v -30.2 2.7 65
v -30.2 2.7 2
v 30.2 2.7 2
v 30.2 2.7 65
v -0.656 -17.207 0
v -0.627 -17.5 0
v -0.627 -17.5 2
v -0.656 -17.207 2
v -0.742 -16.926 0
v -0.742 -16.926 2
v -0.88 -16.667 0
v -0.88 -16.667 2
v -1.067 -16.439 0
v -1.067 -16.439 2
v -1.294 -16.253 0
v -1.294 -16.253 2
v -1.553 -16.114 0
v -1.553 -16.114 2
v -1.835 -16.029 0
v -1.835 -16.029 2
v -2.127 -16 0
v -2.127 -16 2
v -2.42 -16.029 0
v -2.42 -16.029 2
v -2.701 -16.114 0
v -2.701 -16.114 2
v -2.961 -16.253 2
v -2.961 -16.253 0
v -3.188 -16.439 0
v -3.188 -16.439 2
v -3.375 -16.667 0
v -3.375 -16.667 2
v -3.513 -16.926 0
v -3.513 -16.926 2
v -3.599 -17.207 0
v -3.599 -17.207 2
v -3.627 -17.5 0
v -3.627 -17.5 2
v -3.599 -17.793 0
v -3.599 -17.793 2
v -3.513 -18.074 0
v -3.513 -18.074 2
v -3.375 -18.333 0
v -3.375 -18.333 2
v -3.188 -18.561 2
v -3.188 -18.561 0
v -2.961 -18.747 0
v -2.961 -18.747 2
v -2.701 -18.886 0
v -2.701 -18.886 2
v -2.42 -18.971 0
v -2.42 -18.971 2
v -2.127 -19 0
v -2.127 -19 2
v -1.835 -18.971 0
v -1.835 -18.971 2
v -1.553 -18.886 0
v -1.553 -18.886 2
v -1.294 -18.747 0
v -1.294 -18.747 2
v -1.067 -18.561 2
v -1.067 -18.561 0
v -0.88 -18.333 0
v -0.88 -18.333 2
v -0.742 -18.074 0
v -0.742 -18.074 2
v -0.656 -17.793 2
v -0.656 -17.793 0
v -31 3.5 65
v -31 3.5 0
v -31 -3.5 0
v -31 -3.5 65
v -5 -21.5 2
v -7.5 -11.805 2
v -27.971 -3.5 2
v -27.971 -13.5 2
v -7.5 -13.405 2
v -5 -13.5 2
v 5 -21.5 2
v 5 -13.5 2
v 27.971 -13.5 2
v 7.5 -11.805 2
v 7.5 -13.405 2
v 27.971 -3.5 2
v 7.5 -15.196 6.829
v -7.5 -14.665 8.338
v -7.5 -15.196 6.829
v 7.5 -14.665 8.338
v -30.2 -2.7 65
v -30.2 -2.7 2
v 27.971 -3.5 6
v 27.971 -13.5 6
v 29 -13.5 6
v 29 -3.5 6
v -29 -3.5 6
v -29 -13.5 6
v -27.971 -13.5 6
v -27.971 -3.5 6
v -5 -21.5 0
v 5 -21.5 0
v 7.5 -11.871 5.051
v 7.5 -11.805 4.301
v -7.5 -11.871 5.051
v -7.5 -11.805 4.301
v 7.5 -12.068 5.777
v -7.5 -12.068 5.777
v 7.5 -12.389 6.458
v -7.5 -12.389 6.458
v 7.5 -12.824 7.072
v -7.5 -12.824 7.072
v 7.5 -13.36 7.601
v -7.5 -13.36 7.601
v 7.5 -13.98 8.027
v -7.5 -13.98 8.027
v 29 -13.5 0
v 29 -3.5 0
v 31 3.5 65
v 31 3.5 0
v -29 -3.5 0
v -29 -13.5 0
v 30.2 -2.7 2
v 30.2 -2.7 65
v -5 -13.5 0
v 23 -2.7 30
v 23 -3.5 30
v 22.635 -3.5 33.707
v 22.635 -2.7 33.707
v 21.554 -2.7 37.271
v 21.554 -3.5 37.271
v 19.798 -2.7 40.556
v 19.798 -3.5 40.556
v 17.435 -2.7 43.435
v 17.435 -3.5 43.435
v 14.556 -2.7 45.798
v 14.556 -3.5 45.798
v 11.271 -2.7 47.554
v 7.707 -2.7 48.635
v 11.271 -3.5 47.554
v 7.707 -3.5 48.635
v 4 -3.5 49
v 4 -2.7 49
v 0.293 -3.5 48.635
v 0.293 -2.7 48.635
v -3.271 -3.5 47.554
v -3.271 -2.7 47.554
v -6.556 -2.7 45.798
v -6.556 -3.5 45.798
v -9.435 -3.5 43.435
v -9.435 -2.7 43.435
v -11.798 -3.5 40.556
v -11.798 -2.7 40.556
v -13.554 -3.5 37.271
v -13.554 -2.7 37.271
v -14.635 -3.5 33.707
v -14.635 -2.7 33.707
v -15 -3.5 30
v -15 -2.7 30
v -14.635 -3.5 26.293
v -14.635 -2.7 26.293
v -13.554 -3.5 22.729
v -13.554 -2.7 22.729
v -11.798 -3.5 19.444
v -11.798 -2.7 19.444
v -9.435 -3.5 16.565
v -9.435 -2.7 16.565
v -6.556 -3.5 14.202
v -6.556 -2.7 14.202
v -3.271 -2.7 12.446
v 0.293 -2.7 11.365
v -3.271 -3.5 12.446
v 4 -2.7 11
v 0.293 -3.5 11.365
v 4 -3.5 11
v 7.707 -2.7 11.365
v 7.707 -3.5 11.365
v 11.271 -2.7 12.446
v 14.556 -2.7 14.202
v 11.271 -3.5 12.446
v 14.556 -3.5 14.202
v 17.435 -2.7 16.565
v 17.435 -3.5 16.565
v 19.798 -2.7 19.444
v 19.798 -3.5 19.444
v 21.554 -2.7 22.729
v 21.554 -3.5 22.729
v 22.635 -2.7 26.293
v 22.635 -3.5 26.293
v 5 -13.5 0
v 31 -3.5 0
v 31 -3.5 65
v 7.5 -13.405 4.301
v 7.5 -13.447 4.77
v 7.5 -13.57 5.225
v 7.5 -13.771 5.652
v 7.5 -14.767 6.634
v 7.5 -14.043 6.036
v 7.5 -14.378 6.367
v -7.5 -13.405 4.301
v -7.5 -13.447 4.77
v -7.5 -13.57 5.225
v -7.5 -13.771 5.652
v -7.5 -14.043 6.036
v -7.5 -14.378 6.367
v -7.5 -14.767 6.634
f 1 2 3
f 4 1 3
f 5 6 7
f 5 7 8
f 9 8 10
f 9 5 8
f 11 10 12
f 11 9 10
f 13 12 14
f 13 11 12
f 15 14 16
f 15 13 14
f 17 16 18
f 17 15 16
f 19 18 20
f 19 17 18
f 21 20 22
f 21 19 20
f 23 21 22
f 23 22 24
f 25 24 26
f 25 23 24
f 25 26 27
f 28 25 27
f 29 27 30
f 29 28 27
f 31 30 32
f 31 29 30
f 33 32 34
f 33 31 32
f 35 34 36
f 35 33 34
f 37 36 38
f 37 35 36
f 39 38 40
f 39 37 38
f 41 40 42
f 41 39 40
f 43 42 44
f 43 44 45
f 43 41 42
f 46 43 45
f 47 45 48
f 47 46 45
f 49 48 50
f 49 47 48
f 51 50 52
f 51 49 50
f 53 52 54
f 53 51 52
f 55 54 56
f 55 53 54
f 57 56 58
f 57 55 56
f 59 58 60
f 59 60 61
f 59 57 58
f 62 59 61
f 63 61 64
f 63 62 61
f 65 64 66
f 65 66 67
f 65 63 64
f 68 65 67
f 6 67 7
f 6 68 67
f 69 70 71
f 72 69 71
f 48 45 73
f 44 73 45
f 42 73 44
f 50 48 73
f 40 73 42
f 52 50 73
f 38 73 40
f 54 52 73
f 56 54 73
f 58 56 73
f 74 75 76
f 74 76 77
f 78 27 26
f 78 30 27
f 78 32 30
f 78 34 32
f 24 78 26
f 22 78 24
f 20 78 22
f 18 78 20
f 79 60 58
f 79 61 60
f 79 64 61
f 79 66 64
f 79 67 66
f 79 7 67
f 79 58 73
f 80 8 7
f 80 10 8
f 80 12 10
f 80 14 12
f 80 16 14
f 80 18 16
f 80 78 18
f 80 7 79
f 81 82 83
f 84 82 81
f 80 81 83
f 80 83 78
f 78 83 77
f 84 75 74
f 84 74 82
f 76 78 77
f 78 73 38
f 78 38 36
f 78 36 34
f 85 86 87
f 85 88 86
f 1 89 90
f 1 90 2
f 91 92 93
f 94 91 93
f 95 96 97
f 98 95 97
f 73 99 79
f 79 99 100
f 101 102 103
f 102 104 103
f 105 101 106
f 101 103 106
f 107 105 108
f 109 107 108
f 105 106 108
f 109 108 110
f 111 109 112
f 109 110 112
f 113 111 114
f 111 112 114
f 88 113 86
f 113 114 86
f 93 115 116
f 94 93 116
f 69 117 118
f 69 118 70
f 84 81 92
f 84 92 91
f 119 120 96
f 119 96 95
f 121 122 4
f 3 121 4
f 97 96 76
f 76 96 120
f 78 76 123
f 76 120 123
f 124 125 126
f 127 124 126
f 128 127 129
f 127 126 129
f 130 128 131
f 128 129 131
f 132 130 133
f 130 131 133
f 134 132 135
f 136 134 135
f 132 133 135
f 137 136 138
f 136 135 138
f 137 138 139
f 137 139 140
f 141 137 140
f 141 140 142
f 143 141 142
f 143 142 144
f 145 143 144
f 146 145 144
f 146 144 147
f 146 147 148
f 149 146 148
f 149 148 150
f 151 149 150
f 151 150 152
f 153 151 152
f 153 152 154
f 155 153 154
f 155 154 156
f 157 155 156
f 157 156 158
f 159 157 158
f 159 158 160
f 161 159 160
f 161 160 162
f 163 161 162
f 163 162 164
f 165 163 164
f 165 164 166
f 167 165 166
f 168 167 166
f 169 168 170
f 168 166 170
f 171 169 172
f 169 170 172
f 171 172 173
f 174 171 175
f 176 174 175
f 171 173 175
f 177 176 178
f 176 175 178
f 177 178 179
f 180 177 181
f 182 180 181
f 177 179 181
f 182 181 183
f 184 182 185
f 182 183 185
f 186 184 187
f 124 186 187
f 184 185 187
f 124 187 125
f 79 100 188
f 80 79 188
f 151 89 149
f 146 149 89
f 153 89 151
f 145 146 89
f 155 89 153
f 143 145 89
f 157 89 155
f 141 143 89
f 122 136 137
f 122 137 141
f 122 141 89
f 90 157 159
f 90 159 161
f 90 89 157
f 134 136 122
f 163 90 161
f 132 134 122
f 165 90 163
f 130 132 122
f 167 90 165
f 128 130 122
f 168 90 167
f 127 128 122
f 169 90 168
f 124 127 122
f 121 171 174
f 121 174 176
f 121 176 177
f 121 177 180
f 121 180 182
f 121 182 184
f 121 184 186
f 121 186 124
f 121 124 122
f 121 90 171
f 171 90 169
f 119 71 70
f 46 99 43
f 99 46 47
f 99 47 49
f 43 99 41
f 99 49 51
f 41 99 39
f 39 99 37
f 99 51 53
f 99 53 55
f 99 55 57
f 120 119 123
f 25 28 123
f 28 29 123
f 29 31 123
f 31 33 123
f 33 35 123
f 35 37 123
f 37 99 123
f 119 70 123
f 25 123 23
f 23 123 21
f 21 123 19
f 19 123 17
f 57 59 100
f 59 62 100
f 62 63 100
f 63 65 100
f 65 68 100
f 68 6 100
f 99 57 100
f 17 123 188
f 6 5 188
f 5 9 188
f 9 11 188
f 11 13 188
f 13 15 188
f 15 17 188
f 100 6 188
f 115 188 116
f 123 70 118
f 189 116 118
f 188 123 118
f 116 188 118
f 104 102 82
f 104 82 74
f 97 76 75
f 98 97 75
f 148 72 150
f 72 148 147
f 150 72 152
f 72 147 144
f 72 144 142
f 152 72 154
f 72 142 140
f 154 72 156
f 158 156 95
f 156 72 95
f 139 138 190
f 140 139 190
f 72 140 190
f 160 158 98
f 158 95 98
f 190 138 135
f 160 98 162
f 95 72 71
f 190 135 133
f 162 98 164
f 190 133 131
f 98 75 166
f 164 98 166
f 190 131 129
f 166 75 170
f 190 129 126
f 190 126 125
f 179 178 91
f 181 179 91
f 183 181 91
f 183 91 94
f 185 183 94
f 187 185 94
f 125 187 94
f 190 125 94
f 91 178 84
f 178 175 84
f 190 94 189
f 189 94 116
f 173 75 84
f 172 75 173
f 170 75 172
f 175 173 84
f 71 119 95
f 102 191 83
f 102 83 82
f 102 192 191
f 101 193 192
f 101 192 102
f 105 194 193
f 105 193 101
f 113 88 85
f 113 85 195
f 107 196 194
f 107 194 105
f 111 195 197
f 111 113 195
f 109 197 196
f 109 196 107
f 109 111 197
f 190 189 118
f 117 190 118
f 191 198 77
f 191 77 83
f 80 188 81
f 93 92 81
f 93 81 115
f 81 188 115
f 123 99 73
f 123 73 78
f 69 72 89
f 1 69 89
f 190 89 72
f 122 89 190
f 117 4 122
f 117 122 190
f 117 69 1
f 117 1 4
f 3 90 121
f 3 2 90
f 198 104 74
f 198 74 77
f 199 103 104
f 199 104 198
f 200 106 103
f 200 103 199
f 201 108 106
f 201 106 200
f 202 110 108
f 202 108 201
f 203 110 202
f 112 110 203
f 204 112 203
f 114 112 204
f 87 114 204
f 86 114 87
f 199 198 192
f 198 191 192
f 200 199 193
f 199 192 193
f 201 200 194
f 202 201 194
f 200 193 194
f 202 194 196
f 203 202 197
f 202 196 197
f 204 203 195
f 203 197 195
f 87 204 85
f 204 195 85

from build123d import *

# Parameters (mm, degrees)
F0_W     = 60.4
F0_H     = 5.4
F0_W_2   = 10
F0_H_2   = 8
F0_R     = 1.5
F0_W_3   = 1.0285907388
F0_H_3   = 10
F1_DEPTH = 2
F2_DEPTH = 65
F3_R     = 19
F4_DEPTH = 2
F5_DEPTH = 6
F6_W     = 15
F6_H     = 1.6


with BuildPart() as f1:
    # F0 (on Top) → F1 (new body)
    with BuildSketch(Plane.XY):
        Polygon((27.9714092612, -13.5), (27.9714092612, -3.5), (-27.9714092612, -3.5), (-27.9714092612, -13.5), (-5, -13.5), (5, -13.5), align=None)
        Polygon((29, -3.5), (31, -3.5), (31, 3.5), (-31, 3.5), (-31, -3.5), (-29, -3.5), (-27.9714092612, -3.5), (27.9714092612, -3.5), align=None)
        Rectangle(F0_W, F0_H, mode=Mode.SUBTRACT)
        Rectangle(F0_W, F0_H)
        with Locations((0, -17.5)):
            Rectangle(F0_W_2, F0_H_2)
        with Locations((-2.1274185274, -17.5)):
            Circle(F0_R, mode=Mode.SUBTRACT)
        with Locations((-28.4857046306, -8.5)):
            Rectangle(F0_W_3, F0_H_3)
        with Locations((28.4857046306, -8.5)):
            Rectangle(F0_W_3, F0_H_3)
    extrude(amount=F1_DEPTH)

    # F0 (on Top) → F2 (join)
    with BuildSketch(Plane.XY):
        Polygon((29, -3.5), (31, -3.5), (31, 3.5), (-31, 3.5), (-31, -3.5), (-29, -3.5), (-27.9714092612, -3.5), (27.9714092612, -3.5), align=None)
        Rectangle(F0_W, F0_H, mode=Mode.SUBTRACT)
    extrude(amount=F2_DEPTH)

    # F3 (on face) → F4 (cut)
    with BuildSketch(Plane.XZ.offset(3.5)):
        with Locations((4, 30)):
            Circle(F3_R)
    extrude(amount=-F4_DEPTH, mode=Mode.SUBTRACT)

    # F0 (on Top) → F5 (join)
    with BuildSketch(Plane.XY):
        with Locations((28.4857046306, -8.5)):
            Rectangle(F0_W_3, F0_H_3)
        with Locations((-28.4857046306, -8.5)):
            Rectangle(F0_W_3, F0_H_3)
    extrude(amount=F5_DEPTH)

    # F8: sweep along a path in F7
    with BuildLine(Plane.YZ) as f8_path:
        Line((-13.6184291914, 1.5092007816), (-13.6184291914, 4.3010520749))
        ThreePointArc((-13.6184291914, 4.3010520749), (-14.0722220518, 5.726785993), (-15.2666270733, 6.627919618))
    # F6 (on face) → F8 (sweep)
    with BuildSketch(Plane.XY.offset(2)):
        with Locations((0, -12.6052284613)):
            Rectangle(F6_W, F6_H)
    sweep(path=f8_path.line)


solid = f1.part
